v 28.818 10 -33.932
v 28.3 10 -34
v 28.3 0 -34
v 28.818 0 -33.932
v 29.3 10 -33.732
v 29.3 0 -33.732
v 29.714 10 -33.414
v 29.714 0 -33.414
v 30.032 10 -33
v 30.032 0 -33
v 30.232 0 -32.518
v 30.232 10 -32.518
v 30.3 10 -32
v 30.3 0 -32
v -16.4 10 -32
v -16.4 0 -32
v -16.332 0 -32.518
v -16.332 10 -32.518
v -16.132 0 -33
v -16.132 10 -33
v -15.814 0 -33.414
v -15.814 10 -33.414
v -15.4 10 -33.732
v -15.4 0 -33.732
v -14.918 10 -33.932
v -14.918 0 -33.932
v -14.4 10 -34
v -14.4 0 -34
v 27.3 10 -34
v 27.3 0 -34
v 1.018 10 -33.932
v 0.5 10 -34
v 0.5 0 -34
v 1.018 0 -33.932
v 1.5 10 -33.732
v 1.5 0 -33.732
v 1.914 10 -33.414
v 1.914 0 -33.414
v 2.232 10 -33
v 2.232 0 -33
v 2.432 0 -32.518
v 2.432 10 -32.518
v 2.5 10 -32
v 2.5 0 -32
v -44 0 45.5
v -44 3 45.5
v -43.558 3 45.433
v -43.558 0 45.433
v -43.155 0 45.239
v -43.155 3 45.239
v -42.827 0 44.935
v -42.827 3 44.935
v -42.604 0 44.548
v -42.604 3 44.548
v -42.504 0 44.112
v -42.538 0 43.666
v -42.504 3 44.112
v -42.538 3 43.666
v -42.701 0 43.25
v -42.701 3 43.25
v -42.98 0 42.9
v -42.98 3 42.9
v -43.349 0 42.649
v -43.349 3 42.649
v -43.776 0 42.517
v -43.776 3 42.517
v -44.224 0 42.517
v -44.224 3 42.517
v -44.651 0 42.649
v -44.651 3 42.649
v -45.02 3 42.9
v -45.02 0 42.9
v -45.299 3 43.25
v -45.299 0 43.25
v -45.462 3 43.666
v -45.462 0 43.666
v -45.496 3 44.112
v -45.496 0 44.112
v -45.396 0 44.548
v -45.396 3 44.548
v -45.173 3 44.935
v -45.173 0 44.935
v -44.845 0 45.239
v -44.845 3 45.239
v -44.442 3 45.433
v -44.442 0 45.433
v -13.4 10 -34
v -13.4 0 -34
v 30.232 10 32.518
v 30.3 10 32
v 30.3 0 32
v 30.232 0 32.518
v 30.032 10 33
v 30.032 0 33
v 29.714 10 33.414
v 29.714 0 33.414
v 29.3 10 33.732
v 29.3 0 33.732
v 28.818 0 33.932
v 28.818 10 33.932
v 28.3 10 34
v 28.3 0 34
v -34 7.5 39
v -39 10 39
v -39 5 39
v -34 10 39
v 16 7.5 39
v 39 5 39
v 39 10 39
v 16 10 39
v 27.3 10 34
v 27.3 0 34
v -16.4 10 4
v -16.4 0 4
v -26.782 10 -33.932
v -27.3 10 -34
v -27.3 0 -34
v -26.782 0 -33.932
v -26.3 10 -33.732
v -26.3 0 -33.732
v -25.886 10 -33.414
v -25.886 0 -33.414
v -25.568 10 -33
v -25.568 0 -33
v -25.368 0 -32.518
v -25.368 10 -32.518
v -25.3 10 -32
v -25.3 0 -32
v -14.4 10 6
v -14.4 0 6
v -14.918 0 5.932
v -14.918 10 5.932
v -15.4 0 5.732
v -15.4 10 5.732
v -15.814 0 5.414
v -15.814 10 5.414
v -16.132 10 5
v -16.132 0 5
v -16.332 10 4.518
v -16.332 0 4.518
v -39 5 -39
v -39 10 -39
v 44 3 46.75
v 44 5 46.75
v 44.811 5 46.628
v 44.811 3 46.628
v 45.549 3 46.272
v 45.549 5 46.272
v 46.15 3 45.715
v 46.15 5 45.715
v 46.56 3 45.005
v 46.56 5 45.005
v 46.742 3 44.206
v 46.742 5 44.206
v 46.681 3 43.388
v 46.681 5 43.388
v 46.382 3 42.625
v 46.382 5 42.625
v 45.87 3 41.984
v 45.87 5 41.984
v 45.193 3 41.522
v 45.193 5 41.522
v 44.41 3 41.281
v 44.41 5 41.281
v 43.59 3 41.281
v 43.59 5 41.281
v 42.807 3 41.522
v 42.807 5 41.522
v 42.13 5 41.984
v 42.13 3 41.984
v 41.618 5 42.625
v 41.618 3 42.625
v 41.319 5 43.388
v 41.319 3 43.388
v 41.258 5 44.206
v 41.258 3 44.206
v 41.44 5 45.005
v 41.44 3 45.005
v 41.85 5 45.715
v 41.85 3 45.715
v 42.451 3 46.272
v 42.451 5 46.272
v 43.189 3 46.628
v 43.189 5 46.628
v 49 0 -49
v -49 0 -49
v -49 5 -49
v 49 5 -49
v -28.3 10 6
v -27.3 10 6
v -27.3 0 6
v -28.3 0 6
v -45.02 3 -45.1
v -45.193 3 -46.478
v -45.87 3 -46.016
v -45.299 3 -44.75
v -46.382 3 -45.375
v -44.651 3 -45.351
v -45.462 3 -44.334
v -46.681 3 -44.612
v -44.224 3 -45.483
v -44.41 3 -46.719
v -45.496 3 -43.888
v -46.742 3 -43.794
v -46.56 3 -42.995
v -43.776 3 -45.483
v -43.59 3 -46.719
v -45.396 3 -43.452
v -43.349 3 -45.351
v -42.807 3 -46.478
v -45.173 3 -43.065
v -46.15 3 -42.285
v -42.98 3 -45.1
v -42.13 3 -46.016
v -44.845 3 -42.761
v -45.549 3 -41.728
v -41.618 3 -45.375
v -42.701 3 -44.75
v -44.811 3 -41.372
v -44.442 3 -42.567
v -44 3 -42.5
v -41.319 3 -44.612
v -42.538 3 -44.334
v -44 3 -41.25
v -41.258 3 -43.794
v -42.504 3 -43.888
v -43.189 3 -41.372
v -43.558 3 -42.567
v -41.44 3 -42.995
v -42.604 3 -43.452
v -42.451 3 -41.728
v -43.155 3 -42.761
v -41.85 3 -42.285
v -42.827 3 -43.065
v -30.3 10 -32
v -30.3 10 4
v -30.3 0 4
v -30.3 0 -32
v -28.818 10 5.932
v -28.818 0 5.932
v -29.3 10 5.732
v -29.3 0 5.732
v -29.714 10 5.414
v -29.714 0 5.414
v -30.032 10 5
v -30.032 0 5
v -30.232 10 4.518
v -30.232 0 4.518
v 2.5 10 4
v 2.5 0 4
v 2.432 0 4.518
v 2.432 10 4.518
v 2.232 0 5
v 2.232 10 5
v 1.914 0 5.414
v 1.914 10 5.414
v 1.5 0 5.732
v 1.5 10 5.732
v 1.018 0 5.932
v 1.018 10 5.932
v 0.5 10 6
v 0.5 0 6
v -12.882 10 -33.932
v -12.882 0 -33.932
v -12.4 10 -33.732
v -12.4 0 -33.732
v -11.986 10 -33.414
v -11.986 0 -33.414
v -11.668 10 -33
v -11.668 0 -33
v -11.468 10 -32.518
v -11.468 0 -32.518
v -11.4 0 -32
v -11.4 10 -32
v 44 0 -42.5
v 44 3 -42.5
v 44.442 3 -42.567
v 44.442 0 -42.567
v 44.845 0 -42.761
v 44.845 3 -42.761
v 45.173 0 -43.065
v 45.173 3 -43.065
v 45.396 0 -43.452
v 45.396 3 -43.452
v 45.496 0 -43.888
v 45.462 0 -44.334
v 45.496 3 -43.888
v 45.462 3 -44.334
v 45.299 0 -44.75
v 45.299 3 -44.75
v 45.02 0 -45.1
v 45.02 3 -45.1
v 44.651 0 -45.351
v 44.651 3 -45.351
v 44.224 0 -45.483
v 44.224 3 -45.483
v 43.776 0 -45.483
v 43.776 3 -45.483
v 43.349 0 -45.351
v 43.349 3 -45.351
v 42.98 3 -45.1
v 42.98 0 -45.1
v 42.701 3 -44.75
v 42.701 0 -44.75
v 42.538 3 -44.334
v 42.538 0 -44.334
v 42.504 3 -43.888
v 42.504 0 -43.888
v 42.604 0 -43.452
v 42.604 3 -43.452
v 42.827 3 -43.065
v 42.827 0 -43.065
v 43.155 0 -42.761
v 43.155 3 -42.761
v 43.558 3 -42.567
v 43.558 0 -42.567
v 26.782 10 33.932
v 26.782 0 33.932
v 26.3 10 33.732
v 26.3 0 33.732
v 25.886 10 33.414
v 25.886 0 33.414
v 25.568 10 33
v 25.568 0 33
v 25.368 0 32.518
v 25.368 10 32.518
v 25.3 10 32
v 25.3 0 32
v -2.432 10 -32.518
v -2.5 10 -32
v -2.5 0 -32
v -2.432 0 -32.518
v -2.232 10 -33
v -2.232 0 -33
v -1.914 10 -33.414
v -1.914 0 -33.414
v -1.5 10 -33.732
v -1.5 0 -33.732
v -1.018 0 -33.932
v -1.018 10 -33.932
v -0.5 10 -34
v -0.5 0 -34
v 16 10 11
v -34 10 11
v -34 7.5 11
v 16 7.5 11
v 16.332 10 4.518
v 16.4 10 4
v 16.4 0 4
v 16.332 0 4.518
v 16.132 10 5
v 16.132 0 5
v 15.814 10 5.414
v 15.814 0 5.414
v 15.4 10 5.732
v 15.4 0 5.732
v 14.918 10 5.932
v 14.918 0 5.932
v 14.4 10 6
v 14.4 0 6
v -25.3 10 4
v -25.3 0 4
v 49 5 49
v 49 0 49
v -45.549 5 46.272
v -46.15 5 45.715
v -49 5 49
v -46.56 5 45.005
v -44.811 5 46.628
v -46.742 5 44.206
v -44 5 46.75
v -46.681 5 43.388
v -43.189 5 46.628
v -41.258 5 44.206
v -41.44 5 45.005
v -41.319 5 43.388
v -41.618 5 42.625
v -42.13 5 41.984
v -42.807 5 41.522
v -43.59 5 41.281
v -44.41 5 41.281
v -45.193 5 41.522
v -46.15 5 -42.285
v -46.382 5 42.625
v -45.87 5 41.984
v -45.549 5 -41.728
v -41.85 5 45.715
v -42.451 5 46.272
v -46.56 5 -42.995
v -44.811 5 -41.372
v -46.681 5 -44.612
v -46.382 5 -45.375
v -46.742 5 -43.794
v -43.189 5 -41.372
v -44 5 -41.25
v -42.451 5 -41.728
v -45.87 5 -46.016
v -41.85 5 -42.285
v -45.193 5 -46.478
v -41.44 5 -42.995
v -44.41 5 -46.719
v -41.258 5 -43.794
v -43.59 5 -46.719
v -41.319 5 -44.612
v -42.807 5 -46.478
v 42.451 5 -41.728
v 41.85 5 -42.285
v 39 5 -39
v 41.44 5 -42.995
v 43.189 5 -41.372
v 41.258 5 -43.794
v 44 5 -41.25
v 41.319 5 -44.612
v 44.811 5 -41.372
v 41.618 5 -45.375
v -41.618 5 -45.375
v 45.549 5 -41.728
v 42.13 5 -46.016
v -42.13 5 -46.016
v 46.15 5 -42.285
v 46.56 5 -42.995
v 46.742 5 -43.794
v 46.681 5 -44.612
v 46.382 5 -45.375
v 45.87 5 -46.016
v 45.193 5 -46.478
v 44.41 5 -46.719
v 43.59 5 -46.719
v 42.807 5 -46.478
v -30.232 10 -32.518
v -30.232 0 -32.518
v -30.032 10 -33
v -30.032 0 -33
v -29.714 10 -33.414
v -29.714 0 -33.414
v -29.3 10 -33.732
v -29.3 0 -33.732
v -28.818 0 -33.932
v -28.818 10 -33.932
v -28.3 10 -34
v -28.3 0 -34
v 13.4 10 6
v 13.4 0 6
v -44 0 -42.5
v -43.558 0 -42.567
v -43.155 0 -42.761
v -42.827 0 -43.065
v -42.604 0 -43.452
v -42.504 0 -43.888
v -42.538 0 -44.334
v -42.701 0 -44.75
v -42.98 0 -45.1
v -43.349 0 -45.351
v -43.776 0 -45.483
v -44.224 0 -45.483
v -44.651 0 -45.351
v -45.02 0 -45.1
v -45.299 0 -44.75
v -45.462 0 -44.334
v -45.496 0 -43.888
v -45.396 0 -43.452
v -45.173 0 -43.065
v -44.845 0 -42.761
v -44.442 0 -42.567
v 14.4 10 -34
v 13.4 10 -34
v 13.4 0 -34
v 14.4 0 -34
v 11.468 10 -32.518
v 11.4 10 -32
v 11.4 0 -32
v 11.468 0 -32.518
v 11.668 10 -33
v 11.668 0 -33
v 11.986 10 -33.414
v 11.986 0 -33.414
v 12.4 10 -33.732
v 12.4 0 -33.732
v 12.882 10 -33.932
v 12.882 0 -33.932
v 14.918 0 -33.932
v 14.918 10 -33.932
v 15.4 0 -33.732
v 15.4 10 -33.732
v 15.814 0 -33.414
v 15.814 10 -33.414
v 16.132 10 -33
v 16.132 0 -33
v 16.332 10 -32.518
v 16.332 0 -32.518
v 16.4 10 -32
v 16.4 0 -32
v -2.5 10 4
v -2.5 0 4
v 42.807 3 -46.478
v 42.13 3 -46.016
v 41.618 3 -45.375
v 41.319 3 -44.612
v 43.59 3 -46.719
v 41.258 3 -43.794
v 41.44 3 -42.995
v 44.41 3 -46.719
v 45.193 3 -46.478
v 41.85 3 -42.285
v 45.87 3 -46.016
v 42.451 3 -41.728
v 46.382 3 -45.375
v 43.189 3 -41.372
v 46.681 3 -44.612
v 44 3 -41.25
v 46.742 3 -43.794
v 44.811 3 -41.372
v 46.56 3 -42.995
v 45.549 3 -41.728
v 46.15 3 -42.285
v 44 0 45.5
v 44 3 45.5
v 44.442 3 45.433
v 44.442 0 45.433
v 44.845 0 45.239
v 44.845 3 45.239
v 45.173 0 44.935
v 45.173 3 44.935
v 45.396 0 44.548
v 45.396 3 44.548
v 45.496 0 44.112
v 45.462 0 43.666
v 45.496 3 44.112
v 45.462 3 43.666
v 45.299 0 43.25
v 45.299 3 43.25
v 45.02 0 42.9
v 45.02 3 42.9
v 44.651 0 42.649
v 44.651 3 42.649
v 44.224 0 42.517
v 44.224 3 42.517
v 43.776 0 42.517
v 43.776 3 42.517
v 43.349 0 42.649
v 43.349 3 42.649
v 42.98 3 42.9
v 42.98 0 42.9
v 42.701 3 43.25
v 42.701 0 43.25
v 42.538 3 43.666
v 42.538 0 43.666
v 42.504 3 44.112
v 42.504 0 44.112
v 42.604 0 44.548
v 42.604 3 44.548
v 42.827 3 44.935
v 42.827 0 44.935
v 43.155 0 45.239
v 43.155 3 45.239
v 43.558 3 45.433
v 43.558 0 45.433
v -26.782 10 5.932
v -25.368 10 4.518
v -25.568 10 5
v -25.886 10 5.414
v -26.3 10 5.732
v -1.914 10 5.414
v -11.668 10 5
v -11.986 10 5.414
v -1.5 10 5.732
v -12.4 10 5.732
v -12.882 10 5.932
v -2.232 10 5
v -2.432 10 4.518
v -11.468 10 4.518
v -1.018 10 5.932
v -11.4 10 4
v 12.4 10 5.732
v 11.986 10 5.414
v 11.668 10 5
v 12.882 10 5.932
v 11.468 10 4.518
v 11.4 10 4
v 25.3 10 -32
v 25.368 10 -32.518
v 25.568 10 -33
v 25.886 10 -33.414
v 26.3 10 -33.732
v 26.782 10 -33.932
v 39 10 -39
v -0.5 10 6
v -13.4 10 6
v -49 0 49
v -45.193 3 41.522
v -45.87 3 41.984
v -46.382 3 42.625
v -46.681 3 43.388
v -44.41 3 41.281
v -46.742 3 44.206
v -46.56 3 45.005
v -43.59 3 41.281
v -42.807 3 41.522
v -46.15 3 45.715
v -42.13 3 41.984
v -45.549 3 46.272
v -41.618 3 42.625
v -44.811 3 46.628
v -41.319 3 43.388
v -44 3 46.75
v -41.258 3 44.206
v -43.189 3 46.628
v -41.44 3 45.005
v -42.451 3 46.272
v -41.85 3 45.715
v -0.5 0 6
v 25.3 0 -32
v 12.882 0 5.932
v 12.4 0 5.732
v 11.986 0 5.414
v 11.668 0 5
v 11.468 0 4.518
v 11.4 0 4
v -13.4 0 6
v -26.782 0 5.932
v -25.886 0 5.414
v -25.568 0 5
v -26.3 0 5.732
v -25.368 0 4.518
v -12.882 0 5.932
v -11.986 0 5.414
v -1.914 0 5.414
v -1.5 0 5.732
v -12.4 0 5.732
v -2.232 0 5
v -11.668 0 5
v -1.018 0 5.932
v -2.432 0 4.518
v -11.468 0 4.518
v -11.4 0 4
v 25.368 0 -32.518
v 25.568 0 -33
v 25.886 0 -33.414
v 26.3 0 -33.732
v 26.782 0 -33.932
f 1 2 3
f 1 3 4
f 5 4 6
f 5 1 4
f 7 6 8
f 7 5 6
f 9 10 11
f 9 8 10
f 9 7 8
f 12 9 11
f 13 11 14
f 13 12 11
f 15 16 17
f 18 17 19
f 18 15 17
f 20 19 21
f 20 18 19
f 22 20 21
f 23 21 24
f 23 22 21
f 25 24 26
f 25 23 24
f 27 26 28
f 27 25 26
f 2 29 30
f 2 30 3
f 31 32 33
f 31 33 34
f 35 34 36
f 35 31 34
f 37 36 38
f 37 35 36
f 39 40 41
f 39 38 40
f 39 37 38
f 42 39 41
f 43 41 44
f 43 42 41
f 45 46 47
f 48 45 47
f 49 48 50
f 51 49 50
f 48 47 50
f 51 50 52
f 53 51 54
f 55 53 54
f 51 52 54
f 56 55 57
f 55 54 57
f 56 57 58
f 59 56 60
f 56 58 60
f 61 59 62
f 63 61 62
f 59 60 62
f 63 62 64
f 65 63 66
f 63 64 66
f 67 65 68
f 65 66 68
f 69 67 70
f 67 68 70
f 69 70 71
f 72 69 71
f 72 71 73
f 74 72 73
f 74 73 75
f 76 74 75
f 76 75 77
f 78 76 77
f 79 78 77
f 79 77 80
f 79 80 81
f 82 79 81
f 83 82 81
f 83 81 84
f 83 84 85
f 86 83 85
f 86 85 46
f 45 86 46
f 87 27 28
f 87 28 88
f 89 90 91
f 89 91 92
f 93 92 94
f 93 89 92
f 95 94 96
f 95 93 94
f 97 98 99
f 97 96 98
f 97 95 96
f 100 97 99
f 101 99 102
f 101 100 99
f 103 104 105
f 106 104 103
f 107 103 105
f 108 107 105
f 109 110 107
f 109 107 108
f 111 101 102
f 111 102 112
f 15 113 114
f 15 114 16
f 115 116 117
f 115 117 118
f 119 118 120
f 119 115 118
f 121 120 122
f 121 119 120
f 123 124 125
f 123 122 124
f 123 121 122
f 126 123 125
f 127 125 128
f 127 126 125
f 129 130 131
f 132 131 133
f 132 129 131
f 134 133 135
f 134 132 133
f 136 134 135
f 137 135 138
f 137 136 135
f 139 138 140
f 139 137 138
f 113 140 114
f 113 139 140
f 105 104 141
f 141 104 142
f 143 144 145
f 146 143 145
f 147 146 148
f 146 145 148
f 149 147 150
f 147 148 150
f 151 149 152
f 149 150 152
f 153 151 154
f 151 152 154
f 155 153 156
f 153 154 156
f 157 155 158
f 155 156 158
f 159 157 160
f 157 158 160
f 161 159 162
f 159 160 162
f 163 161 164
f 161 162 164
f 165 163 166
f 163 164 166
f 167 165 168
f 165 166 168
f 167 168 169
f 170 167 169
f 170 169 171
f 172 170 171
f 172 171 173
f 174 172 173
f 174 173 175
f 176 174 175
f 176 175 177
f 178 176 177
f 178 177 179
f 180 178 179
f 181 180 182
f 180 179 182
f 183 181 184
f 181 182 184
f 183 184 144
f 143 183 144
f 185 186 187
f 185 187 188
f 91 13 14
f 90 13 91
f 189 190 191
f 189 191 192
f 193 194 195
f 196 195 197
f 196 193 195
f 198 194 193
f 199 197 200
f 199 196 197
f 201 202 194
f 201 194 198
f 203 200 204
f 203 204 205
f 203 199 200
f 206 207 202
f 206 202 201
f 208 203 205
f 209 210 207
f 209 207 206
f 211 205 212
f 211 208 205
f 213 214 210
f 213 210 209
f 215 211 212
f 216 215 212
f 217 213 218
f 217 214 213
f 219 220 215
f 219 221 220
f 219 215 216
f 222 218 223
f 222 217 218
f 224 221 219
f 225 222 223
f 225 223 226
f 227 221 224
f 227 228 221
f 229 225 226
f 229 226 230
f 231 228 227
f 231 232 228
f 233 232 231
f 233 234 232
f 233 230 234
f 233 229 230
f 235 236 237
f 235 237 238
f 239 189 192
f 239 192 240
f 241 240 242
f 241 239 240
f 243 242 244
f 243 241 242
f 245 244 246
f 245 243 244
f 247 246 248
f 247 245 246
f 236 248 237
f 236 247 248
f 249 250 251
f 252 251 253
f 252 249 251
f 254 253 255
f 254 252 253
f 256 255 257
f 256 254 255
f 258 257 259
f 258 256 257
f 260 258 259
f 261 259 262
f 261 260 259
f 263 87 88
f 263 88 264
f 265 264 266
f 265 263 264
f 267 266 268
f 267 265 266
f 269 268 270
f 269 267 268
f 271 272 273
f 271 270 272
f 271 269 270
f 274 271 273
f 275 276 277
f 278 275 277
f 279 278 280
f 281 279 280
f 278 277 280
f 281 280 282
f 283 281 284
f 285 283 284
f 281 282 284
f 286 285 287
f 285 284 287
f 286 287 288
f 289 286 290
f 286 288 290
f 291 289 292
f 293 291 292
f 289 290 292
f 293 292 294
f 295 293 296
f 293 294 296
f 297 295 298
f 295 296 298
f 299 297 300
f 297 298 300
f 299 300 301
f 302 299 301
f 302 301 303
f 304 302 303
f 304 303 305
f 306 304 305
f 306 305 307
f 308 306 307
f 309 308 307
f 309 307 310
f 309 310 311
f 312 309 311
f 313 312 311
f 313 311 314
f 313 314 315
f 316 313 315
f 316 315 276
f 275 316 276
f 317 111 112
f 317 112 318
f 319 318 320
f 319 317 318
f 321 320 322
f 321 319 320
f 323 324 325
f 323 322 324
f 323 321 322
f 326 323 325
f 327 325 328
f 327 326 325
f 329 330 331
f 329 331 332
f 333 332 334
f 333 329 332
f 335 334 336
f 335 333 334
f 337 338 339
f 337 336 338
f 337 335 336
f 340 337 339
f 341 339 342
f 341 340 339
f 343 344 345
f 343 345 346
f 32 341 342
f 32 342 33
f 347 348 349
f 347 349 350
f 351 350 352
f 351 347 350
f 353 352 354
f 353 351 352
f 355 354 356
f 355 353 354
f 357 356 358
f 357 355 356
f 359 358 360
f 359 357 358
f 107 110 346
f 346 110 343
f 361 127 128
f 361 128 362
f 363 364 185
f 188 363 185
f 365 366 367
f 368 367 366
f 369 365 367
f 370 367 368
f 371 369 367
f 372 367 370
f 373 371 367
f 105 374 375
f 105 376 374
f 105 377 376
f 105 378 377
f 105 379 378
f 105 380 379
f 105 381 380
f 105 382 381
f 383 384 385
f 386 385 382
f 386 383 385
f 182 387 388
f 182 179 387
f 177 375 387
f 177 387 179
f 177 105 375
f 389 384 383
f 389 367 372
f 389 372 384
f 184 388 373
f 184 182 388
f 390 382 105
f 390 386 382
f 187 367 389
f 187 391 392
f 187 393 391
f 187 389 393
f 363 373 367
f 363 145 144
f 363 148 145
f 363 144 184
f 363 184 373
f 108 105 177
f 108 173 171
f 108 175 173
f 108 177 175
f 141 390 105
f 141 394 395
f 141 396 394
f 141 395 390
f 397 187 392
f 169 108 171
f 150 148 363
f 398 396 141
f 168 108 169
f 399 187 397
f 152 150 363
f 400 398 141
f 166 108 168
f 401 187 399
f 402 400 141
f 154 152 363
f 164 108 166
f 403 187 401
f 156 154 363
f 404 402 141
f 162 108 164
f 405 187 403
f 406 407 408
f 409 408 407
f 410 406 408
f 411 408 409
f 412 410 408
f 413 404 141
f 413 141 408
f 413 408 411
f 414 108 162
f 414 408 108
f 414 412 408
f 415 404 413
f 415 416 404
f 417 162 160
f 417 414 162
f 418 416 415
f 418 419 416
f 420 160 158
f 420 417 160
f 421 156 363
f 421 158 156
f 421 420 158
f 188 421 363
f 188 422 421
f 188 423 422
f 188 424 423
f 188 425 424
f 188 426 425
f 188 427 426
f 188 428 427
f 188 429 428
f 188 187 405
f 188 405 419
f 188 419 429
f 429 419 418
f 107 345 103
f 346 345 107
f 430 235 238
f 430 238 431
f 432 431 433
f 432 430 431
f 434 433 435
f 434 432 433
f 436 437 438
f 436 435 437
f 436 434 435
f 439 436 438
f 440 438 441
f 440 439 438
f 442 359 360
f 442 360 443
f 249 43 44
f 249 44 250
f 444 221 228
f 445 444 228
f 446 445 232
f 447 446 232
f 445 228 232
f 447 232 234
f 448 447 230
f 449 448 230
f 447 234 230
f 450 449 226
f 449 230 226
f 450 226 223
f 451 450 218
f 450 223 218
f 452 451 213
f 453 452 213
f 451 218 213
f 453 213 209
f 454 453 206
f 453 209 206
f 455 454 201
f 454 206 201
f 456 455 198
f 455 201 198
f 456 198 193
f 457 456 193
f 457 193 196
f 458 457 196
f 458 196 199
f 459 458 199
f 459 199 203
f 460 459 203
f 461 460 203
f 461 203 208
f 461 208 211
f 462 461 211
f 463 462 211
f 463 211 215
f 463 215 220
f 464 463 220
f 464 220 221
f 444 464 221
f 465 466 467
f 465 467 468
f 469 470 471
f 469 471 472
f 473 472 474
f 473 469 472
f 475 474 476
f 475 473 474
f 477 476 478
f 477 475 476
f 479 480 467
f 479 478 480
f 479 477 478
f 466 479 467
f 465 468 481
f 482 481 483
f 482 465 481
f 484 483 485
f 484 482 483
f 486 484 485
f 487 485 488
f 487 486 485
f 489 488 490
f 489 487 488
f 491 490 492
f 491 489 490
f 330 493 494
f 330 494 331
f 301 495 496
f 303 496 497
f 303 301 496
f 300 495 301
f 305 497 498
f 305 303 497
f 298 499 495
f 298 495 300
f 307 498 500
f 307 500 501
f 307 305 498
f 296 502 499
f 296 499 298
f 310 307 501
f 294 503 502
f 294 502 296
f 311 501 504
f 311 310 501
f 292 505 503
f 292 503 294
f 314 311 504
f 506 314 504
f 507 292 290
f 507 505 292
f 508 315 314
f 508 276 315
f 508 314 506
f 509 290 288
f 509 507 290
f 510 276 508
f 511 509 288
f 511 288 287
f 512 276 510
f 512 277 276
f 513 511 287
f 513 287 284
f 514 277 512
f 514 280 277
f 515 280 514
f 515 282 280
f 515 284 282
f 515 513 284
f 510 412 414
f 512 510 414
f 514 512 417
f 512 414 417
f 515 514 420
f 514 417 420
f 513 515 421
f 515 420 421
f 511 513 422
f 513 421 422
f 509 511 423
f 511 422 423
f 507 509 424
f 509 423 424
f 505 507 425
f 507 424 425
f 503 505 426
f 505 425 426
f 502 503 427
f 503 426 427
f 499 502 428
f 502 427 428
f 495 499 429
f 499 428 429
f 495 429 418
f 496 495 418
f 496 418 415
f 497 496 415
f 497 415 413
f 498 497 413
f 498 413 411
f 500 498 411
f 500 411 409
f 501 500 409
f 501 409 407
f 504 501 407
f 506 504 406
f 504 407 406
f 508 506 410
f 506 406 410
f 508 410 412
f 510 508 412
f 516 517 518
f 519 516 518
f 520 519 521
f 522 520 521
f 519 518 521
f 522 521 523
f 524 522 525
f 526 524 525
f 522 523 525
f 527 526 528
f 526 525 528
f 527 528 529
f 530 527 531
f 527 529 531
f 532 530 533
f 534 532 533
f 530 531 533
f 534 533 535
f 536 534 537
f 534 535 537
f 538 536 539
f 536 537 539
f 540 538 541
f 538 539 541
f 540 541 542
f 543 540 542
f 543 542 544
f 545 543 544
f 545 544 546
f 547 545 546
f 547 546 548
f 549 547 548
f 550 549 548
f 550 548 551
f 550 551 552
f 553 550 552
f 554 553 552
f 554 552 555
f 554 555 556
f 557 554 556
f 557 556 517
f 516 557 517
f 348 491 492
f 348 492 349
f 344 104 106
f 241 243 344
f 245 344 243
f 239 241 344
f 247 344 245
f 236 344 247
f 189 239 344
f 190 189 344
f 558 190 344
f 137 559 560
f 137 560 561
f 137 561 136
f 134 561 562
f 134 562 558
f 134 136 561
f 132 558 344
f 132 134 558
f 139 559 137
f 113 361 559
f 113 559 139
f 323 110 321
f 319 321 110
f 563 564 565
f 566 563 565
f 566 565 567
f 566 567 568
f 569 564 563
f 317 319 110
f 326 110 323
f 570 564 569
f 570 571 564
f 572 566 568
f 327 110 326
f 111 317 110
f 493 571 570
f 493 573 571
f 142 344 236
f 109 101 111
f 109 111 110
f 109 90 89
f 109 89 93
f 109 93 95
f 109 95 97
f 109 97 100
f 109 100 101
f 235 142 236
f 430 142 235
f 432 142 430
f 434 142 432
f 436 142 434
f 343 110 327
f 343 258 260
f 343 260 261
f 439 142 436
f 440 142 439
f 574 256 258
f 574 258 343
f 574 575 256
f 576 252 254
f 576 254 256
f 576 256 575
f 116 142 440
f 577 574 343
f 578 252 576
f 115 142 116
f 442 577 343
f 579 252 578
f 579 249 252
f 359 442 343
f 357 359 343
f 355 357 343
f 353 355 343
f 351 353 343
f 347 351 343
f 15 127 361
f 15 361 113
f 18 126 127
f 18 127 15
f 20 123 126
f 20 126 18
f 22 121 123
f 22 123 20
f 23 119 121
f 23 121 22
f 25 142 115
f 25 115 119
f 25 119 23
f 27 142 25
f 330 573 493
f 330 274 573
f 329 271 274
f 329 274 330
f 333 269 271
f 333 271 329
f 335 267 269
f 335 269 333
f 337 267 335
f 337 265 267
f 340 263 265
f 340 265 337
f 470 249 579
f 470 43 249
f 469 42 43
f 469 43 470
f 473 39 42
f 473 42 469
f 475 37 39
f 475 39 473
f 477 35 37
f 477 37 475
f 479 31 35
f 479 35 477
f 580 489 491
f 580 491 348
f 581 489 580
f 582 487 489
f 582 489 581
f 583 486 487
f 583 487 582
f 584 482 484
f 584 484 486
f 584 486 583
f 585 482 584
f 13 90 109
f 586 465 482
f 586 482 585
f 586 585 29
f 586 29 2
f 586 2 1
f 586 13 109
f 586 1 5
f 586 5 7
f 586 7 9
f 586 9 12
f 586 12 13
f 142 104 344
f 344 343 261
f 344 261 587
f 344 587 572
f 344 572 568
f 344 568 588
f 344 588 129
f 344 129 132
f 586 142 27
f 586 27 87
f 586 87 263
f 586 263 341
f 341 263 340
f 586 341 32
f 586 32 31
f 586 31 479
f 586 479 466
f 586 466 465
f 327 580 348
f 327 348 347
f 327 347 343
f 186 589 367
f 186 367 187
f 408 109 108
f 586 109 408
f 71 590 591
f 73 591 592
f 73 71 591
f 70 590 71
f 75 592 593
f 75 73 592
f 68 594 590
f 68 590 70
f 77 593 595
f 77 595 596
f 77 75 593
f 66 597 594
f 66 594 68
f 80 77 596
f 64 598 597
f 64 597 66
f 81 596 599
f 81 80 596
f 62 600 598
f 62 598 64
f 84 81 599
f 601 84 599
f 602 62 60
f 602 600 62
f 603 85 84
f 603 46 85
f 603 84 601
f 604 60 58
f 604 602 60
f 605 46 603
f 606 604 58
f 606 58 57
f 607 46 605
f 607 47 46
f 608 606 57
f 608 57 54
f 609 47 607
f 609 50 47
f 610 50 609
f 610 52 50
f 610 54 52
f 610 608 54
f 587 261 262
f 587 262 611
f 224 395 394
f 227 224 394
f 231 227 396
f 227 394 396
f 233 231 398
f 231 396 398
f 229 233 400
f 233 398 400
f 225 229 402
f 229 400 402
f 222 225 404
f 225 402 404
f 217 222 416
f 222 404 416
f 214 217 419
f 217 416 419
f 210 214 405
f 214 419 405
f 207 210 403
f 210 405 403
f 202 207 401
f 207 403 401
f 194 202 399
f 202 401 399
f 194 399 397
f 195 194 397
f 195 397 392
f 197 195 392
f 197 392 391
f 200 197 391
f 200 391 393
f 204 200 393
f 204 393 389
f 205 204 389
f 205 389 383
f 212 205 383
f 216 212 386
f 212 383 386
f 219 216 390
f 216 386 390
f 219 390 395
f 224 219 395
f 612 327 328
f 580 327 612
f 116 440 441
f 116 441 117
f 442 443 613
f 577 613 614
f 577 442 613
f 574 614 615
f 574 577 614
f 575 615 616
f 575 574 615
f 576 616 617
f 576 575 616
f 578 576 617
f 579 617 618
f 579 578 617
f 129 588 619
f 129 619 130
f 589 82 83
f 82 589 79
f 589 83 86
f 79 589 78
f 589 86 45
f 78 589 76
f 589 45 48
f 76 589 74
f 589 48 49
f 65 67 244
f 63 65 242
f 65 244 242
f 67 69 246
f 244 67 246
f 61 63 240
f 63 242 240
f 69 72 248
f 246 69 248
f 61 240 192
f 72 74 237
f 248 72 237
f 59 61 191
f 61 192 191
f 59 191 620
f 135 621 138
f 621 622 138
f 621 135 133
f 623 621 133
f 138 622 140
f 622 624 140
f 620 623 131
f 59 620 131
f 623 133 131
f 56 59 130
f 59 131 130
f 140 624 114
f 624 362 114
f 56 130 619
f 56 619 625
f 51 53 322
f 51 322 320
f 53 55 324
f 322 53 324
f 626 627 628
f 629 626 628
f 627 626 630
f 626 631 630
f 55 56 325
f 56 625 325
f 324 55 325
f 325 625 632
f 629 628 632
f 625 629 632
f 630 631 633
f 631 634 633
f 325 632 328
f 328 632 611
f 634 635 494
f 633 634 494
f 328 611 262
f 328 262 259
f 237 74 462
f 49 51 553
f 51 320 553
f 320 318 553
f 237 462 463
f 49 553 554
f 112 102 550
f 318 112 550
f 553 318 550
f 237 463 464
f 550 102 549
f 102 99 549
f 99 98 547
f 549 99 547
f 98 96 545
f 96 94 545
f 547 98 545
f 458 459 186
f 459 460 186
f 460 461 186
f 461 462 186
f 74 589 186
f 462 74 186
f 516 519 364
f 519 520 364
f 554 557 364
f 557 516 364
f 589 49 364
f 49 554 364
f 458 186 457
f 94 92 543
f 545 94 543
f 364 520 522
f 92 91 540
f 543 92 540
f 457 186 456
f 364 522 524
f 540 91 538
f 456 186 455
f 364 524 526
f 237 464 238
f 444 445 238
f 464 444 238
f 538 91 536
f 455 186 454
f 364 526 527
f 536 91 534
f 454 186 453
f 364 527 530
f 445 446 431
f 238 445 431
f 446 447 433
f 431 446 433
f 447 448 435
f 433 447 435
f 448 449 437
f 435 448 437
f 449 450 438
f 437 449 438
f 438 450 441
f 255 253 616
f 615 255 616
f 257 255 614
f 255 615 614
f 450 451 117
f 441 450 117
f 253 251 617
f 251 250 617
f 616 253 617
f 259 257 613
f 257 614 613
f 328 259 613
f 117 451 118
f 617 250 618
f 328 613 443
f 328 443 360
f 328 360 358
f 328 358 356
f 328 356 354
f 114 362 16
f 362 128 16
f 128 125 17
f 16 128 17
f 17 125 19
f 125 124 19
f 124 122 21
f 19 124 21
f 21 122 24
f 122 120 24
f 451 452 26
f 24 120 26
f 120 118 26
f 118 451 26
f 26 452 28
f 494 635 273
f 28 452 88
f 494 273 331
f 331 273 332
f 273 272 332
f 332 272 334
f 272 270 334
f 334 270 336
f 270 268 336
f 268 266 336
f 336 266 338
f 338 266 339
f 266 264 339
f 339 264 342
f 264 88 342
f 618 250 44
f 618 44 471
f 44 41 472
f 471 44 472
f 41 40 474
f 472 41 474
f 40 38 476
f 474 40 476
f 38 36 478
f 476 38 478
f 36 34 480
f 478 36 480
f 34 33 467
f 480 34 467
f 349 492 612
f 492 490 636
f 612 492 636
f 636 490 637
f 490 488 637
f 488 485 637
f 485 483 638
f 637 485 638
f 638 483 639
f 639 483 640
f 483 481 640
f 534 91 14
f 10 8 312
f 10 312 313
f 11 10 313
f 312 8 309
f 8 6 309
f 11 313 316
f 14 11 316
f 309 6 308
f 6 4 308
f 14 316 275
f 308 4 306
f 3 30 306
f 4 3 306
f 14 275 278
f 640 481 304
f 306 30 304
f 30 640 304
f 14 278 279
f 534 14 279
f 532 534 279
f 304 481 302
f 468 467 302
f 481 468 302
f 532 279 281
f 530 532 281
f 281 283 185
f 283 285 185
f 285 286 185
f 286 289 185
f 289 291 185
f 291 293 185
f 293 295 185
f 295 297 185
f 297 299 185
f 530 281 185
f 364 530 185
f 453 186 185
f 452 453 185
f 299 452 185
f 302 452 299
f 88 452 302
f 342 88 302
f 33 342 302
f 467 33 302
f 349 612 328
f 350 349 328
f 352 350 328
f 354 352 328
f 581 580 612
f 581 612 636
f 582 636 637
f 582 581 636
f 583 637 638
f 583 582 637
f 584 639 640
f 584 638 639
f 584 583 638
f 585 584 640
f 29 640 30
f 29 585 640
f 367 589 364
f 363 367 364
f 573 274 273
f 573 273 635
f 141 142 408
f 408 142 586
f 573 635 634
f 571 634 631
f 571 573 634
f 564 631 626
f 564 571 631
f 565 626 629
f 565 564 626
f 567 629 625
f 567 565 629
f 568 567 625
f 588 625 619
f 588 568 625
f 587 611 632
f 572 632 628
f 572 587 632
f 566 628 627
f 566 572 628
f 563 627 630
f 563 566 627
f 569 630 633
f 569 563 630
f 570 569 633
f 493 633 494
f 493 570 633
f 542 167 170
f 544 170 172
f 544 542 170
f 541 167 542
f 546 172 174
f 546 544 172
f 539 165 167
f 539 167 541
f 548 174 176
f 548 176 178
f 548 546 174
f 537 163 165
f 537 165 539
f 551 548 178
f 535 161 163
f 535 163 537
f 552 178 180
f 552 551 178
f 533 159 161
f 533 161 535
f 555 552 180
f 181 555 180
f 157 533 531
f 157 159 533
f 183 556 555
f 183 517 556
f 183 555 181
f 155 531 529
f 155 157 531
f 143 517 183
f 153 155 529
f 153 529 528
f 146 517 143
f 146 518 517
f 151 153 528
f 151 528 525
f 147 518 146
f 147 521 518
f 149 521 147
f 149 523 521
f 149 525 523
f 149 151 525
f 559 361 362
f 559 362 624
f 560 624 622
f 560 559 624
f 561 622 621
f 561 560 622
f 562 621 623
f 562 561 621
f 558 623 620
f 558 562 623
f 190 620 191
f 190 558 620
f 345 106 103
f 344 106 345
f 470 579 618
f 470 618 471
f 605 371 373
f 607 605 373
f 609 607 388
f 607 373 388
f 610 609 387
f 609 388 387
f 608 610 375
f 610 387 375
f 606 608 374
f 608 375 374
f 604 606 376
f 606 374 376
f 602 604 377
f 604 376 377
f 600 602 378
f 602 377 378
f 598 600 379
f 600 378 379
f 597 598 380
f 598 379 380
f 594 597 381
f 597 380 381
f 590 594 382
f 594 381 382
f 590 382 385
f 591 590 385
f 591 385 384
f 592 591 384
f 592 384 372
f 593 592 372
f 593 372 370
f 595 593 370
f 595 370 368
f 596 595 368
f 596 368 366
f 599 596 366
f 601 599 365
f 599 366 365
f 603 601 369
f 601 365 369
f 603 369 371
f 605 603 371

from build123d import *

# Parameters (mm, degrees)
SKETCH1_W           = 98
SKETCH1_H           = 98
BOSS_EXTRUDE2_DEPTH = 10
SKETCH2_W           = 98
SKETCH2_H           = 98
SKETCH2_W_2         = 78
SKETCH2_H_2         = 78
CUT_EXTRUDE2_DEPTH  = 5
SKETCH3_R           = 2.75
CUT_EXTRUDE3_DEPTH  = 2
SKETCH4_R           = 1.5
CUT_EXTRUDE4_DEPTH  = 9
SKETCH6_W           = 50
SKETCH6_H           = 28
CUT_EXTRUDE6_DEPTH  = 2.5
CUT_EXTRUDE8_DEPTH  = 11.5


with BuildPart() as part:
    # Sketch1 → Boss-Extrude2 (new body)
    with BuildSketch(Plane(origin=(0, 0, 0), x_dir=(1, 0, 0), z_dir=(0, 1, 0))):
        Rectangle(SKETCH1_W, SKETCH1_H)
    extrude(amount=BOSS_EXTRUDE2_DEPTH)

    # Sketch2 → Cut-Extrude2 (cut)
    with BuildSketch(Plane(origin=(0, 10, 0), x_dir=(1, 0, 0), z_dir=(0, 1, 0))):
        Rectangle(SKETCH2_W, SKETCH2_H)
        Rectangle(SKETCH2_W_2, SKETCH2_H_2, mode=Mode.SUBTRACT)
    extrude(amount=-CUT_EXTRUDE2_DEPTH, mode=Mode.SUBTRACT)

    # Sketch3 → Cut-Extrude3 (cut)
    with BuildSketch(Plane(origin=(0, 5, 0), x_dir=(1, 0, 0), z_dir=(0, 1, 0))):
        with Locations(Location((-44, -44, 0), (0, 0, 270))):
            Circle(SKETCH3_R)
        with Locations(Location((44, -44, 0), (0, 0, 270))):
            Circle(SKETCH3_R)
        with Locations(Location((-44, 44, 0), (0, 0, 270))):
            Circle(SKETCH3_R)
        with Locations(Location((44, 44, 0), (0, 0, 270))):
            Circle(SKETCH3_R)
    extrude(amount=-CUT_EXTRUDE3_DEPTH, mode=Mode.SUBTRACT)

    # Sketch4 → Cut-Extrude4 (cut)
    with BuildSketch(Plane(origin=(0, 3, 0), x_dir=(1, 0, 0), z_dir=(0, 1, 0))):
        with Locations(Location((-44, 44, 0), (0, 0, 270))):
            Circle(SKETCH4_R)
        with Locations(Location((44, 44, 0), (0, 0, 270))):
            Circle(SKETCH4_R)
        with Locations(Location((44, -44, 0), (0, 0, 270))):
            Circle(SKETCH4_R)
        with Locations(Location((-44, -44, 0), (0, 0, 270))):
            Circle(SKETCH4_R)
    extrude(amount=-CUT_EXTRUDE4_DEPTH, mode=Mode.SUBTRACT)

    # Sketch6 → Cut-Extrude6 (cut)
    with BuildSketch(Plane(origin=(0, 10, 0), x_dir=(1, 0, 0), z_dir=(0, 1, 0))):
        with Locations((-9, -25)):
            Rectangle(SKETCH6_W, SKETCH6_H)
    extrude(amount=-CUT_EXTRUDE6_DEPTH, mode=Mode.SUBTRACT)

    # Sketch7 → Cut-Extrude8 (cut)
    with BuildSketch(Plane(origin=(0, 10, 0), x_dir=(1, 0, 0), z_dir=(0, 1, 0))):
        with BuildLine():
            ThreePointArc((-30.3, 32), (-29.714213562, 33.414213562), (-28.3, 34))
            Line((-28.3, 34), (-27.3, 34))
            ThreePointArc((-27.3, 34), (-25.885786438, 33.414213562), (-25.3, 32))
            Line((-25.3, 32), (-25.3, -4))
            ThreePointArc((-25.3, -4), (-25.885786438, -5.414213562), (-27.3, -6))
            Line((-27.3, -6), (-28.3, -6))
            ThreePointArc((-28.3, -6), (-29.714213562, -5.414213562), (-30.3, -4))
            Line((-30.3, -4), (-30.3, 32))
        make_face()
        with BuildLine():
            ThreePointArc((-14.4, -6), (-15.814213562, -5.414213562), (-16.4, -4))
            Line((-16.4, -4), (-16.4, 32))
            ThreePointArc((-16.4, 32), (-15.814213562, 33.414213562), (-14.4, 34))
            Line((-14.4, 34), (-13.4, 34))
            ThreePointArc((-13.4, 34), (-11.985786438, 33.414213562), (-11.4, 32))
            Line((-11.4, 32), (-11.4, -4))
            ThreePointArc((-11.4, -4), (-11.985786438, -5.414213562), (-13.4, -6))
            Line((-13.4, -6), (-14.4, -6))
        make_face()
        with BuildLine():
            ThreePointArc((-0.5, -6), (-1.914213562, -5.414213562), (-2.5, -4))
            Line((-2.5, -4), (-2.5, 32))
            ThreePointArc((-2.5, 32), (-1.914213562, 33.414213562), (-0.5, 34))
            Line((-0.5, 34), (0.5, 34))
            ThreePointArc((0.5, 34), (1.914213562, 33.414213562), (2.5, 32))
            Line((2.5, 32), (2.5, -4))
            ThreePointArc((2.5, -4), (1.914213562, -5.414213562), (0.5, -6))
            Line((0.5, -6), (-0.5, -6))
        make_face()
        with BuildLine():
            ThreePointArc((13.4, -6), (11.985786438, -5.414213562), (11.4, -4))
            Line((11.4, -4), (11.4, 32))
            ThreePointArc((11.4, 32), (11.985786438, 33.414213562), (13.4, 34))
            Line((13.4, 34), (14.4, 34))
            ThreePointArc((14.4, 34), (15.814213562, 33.414213562), (16.4, 32))
            Line((16.4, 32), (16.4, -4))
            ThreePointArc((16.4, -4), (15.814213562, -5.414213562), (14.4, -6))
            Line((14.4, -6), (13.4, -6))
        make_face()
        with BuildLine():
            ThreePointArc((27.3, -34), (25.885786438, -33.414213562), (25.3, -32))
            Line((25.3, -32), (25.3, -6))
            Line((25.3, -6), (25.3, 32))
            ThreePointArc((25.3, 32), (25.885786438, 33.414213562), (27.3, 34))
            Line((27.3, 34), (28.3, 34))
            ThreePointArc((28.3, 34), (29.714213562, 33.414213562), (30.3, 32))
            Line((30.3, 32), (30.3, -6))
            Line((30.3, -6), (30.3, -32))
            ThreePointArc((30.3, -32), (29.714213562, -33.414213562), (28.3, -34))
            Line((28.3, -34), (27.3, -34))
        make_face()
    extrude(amount=-CUT_EXTRUDE8_DEPTH, mode=Mode.SUBTRACT)


solid = part.part
